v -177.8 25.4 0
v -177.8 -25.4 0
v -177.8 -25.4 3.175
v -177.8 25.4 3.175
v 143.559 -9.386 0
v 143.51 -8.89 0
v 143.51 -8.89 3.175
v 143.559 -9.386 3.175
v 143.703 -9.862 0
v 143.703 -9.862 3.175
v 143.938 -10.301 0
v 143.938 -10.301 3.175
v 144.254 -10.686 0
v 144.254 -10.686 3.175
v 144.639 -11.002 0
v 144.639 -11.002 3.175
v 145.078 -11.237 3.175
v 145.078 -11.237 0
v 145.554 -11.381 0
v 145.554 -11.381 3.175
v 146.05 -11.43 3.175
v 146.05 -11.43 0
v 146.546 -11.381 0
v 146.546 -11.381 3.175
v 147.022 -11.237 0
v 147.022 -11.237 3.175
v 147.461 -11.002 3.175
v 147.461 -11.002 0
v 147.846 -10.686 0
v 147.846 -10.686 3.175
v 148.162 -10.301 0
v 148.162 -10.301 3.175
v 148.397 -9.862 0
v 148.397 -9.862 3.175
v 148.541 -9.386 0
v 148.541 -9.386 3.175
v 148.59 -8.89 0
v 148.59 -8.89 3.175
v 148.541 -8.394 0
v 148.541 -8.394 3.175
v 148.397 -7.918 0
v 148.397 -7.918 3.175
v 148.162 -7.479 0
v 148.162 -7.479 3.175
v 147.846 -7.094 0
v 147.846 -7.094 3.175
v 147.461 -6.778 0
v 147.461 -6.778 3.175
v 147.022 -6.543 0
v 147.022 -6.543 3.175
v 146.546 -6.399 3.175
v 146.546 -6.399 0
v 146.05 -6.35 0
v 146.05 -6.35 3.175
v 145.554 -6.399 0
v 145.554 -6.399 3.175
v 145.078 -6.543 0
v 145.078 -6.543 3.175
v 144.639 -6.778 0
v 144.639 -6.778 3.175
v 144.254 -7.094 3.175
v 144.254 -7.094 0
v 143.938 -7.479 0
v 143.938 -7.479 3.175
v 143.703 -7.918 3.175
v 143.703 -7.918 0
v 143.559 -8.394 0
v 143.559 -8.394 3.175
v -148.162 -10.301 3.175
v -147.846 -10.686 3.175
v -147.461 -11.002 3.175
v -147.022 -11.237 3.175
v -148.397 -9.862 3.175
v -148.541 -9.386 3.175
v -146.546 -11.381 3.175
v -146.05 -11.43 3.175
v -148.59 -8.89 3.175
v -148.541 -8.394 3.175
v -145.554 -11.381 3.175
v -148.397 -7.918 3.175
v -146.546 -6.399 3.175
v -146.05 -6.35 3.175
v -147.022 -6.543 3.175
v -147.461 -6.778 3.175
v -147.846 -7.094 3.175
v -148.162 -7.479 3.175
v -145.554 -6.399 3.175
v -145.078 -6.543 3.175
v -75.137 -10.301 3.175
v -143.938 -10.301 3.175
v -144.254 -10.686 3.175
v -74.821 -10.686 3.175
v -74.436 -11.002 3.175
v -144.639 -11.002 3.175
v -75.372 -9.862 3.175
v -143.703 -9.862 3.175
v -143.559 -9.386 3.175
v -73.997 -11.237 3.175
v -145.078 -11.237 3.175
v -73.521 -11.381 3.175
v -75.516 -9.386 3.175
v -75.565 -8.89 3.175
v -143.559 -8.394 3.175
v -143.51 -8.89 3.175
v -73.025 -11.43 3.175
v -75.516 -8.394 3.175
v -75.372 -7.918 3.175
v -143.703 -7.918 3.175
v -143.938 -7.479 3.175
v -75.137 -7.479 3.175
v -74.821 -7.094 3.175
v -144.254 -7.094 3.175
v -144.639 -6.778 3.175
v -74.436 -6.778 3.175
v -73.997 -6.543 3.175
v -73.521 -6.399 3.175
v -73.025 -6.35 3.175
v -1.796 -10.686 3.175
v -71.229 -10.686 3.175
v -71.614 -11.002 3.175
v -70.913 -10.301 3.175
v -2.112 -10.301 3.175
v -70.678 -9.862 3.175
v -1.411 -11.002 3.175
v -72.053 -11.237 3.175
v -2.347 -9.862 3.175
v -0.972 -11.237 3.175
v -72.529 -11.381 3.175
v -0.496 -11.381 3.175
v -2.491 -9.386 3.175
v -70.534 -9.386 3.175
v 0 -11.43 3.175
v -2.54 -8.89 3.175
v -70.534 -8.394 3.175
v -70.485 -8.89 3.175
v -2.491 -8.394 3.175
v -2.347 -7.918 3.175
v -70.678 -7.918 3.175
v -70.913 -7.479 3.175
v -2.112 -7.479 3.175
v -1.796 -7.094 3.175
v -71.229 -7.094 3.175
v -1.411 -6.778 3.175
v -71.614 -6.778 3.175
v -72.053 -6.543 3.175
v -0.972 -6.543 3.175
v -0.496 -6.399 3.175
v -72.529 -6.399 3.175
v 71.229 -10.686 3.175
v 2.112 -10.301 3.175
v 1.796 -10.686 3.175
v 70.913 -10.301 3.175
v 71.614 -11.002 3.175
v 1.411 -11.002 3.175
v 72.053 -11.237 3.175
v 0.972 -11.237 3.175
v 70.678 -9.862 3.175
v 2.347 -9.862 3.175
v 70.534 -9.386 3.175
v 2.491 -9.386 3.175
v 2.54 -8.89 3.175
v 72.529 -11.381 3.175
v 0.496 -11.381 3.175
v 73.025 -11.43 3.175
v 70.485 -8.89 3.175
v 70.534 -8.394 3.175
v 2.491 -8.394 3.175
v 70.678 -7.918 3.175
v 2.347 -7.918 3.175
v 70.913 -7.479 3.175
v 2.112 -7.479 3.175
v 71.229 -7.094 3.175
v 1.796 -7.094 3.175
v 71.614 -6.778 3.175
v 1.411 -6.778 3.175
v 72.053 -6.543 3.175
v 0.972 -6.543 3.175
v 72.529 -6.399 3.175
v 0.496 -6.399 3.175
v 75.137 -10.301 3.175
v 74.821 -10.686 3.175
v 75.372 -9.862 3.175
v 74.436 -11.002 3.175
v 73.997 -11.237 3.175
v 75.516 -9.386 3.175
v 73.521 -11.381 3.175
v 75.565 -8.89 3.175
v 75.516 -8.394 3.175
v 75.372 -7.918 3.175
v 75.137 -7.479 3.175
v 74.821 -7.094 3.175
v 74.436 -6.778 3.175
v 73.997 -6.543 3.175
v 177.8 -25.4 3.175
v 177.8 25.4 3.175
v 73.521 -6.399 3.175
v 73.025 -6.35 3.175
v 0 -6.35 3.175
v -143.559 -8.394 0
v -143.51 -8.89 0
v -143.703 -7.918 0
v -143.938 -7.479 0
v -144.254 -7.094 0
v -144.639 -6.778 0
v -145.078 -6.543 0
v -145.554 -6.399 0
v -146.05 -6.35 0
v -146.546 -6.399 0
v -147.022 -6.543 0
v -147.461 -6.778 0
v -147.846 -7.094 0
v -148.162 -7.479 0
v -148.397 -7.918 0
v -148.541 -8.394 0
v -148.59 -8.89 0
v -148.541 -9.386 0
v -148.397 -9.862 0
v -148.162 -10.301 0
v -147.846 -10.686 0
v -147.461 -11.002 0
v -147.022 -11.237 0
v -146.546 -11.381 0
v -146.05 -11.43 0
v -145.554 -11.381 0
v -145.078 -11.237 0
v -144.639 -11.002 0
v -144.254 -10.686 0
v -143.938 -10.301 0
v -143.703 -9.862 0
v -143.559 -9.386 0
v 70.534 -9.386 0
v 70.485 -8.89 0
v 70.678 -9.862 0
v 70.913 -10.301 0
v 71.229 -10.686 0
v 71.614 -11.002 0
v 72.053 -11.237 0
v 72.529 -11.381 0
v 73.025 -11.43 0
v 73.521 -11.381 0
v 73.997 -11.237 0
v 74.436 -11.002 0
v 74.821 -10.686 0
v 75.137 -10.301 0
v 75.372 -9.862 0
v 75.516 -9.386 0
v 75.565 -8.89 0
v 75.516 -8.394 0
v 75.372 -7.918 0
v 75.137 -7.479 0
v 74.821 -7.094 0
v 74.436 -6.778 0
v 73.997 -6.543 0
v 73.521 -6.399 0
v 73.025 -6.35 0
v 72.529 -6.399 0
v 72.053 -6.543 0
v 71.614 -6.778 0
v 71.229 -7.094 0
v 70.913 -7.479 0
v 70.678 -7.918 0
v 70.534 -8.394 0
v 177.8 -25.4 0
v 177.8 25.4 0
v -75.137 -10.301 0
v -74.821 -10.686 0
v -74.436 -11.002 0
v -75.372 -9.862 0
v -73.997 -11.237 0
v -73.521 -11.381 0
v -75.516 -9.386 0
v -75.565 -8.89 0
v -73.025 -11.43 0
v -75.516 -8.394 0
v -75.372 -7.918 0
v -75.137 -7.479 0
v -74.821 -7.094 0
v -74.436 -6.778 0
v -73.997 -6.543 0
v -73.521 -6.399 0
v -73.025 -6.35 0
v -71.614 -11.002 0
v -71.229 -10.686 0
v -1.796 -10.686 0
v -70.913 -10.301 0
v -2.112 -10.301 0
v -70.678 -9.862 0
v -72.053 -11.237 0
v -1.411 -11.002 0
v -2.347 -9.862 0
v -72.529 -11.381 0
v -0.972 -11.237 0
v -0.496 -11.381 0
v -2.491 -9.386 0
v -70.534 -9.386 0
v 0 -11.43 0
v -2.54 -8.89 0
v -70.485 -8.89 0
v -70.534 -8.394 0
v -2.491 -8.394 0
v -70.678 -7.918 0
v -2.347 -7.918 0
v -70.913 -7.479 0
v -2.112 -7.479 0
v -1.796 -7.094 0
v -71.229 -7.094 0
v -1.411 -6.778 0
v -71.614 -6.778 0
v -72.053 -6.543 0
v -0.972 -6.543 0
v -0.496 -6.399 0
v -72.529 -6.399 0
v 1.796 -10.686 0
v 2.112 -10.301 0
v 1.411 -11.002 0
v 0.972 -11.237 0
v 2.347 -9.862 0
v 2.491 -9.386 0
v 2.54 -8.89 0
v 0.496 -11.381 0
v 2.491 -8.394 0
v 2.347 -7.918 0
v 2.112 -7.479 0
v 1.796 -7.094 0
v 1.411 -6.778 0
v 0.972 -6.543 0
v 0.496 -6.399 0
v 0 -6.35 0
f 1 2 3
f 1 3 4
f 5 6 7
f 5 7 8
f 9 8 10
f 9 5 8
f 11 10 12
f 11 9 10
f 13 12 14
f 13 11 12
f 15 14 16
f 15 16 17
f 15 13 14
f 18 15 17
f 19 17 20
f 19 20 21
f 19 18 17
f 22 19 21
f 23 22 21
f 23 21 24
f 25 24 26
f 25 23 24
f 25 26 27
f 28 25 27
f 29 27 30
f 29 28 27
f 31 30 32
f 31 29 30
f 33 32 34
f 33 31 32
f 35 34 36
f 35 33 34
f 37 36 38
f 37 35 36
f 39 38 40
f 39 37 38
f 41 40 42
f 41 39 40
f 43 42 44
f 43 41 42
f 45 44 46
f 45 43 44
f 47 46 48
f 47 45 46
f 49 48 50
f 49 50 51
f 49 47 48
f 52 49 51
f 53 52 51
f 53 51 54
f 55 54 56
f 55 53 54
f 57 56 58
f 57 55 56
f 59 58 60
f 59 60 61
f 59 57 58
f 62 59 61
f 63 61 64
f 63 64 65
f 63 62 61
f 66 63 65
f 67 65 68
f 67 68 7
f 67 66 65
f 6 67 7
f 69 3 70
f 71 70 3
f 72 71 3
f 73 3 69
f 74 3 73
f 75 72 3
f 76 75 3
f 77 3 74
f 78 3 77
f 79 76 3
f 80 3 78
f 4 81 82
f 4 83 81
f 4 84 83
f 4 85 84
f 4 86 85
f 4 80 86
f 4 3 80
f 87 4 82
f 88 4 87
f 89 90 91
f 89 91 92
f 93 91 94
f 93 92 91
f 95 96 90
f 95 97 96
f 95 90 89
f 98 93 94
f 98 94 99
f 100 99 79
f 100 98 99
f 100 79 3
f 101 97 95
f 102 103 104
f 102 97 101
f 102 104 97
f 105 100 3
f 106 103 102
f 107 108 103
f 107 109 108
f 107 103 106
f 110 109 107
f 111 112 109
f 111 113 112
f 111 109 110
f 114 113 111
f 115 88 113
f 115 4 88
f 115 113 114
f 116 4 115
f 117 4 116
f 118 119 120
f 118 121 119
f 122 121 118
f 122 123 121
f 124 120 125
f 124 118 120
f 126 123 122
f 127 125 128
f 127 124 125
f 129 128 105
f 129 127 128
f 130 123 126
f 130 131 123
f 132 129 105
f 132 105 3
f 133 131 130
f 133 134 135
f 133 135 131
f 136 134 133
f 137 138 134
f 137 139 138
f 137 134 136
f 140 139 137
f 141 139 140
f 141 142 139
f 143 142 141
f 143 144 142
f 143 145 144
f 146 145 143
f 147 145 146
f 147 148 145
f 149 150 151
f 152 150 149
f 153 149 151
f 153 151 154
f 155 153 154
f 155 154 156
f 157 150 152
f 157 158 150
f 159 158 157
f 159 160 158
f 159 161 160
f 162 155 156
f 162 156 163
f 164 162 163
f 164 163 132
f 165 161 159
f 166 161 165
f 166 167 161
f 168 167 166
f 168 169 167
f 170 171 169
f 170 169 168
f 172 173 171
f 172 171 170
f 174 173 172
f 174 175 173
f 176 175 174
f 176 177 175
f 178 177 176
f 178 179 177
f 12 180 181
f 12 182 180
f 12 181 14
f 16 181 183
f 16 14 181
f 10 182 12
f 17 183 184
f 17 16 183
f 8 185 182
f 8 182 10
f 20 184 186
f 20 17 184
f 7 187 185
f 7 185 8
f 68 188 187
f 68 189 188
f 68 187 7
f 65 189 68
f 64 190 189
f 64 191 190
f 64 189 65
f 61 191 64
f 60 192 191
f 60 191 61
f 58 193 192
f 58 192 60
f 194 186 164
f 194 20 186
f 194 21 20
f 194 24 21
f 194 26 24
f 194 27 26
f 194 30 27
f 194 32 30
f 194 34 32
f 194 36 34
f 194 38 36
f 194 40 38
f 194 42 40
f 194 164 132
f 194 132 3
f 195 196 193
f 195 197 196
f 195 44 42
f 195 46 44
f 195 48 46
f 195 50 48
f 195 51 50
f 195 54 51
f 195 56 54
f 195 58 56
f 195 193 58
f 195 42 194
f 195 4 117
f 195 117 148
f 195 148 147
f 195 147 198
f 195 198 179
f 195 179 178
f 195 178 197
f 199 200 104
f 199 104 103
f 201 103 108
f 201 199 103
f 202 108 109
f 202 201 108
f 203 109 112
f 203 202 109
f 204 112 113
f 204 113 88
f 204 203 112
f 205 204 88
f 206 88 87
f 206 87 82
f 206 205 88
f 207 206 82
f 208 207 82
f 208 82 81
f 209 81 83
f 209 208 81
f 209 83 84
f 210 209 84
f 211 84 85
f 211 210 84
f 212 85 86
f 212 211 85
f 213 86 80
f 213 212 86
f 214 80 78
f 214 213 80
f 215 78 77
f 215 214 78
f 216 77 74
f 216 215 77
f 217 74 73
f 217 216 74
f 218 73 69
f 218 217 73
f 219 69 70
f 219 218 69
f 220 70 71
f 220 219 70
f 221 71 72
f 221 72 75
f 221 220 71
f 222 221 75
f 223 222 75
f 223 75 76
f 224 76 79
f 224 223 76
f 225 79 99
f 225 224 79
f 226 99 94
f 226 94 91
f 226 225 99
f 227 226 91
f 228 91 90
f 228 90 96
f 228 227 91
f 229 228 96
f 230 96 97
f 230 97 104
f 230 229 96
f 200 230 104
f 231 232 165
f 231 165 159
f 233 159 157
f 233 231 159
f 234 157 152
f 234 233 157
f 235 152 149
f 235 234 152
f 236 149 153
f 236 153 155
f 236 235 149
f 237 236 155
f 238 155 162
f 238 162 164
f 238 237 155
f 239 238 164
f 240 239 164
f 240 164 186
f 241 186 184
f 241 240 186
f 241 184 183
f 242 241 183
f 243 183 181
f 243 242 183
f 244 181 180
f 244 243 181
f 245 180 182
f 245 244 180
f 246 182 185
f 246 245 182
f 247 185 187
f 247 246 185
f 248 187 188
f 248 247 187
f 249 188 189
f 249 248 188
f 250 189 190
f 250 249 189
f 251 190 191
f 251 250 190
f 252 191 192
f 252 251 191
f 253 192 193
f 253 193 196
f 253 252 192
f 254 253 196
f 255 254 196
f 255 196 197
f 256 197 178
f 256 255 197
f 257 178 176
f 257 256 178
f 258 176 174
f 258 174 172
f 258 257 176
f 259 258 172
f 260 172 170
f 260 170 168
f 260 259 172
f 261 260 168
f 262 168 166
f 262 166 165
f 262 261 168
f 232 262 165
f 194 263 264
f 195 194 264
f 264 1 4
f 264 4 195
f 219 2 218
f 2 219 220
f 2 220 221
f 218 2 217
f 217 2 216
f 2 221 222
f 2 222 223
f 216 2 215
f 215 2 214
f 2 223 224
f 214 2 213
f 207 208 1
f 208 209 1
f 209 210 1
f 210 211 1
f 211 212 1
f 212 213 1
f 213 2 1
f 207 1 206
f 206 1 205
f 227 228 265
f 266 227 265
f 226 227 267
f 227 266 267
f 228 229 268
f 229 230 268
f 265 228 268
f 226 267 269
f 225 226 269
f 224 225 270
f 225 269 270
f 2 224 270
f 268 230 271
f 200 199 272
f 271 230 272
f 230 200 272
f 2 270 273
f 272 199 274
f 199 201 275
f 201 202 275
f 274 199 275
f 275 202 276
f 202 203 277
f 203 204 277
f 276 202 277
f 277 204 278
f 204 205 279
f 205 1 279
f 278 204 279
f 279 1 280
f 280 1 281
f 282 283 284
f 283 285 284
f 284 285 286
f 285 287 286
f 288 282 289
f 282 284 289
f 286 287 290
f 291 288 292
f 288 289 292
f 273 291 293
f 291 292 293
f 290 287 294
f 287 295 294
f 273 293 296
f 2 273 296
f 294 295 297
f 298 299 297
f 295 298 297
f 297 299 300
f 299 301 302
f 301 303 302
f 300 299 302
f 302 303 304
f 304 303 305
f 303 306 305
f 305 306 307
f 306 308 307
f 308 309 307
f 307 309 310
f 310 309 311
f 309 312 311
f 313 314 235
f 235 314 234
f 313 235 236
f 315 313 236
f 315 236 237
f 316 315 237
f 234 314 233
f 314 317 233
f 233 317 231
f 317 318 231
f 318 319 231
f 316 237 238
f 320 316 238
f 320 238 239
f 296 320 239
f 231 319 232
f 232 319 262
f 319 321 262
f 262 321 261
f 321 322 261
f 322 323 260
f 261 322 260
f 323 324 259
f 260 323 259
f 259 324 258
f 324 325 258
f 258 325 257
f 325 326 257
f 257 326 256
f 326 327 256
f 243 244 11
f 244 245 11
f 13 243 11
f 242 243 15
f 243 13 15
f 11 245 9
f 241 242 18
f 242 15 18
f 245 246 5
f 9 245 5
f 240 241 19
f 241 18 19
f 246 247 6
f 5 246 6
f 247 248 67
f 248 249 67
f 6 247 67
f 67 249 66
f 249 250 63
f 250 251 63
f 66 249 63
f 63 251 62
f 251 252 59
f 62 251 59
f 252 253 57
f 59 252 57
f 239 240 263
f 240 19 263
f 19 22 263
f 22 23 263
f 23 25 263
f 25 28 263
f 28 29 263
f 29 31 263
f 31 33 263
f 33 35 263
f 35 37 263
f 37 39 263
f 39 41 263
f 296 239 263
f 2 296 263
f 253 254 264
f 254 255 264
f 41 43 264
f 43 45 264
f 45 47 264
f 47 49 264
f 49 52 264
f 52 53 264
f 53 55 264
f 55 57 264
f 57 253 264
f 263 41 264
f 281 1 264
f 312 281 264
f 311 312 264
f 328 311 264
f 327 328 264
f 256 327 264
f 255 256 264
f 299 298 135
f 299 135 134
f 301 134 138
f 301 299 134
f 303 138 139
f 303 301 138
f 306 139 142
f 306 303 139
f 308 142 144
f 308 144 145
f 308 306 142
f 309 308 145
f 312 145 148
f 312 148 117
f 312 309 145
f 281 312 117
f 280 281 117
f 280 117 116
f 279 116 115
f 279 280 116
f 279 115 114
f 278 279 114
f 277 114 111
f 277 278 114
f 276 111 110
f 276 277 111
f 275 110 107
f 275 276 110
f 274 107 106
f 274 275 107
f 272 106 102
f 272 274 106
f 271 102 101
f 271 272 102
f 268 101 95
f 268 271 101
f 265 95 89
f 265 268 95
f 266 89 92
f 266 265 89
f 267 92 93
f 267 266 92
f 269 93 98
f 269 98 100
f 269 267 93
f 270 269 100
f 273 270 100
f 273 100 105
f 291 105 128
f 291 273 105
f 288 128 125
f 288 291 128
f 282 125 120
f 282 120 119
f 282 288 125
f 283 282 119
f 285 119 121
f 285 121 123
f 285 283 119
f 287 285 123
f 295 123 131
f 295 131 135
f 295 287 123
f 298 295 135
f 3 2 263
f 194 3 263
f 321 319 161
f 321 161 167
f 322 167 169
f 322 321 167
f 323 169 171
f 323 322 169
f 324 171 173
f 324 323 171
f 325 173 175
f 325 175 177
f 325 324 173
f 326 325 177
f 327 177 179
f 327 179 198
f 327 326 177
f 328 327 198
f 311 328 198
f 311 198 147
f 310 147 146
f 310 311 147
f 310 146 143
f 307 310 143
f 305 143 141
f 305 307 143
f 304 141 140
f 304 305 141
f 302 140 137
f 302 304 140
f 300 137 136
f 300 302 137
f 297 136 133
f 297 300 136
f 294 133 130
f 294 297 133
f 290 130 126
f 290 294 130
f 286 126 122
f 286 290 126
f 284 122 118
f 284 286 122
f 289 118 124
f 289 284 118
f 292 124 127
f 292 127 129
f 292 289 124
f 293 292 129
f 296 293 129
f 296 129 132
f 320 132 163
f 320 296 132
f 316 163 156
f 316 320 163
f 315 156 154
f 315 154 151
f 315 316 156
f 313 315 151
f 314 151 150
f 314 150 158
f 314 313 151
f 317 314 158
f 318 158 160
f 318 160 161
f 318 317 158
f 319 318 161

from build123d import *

# Parameters (mm, degrees)
SKETCH1_W           = 355.6
SKETCH1_H           = 50.8
SKETCH1_R           = 2.54
BOSS_EXTRUDE1_DEPTH = 3.175


with BuildPart() as part:
    # Sketch1 → Boss-Extrude1 (new body)
    with BuildSketch(Plane.XY):
        Rectangle(SKETCH1_W, SKETCH1_H)
        with Locations((0, -8.89)):
            Circle(SKETCH1_R, mode=Mode.SUBTRACT)
        with Locations((-146.05, -8.89)):
            Circle(SKETCH1_R, mode=Mode.SUBTRACT)
        with Locations((-73.025, -8.89)):
            Circle(SKETCH1_R, mode=Mode.SUBTRACT)
        with Locations(Location((73.025, -8.89, 0), (0, 0, 180))):
            Circle(SKETCH1_R, mode=Mode.SUBTRACT)
        with Locations(Location((146.05, -8.89, 0), (0, 0, 180))):
            Circle(SKETCH1_R, mode=Mode.SUBTRACT)
    extrude(amount=BOSS_EXTRUDE1_DEPTH)


solid = part.part
